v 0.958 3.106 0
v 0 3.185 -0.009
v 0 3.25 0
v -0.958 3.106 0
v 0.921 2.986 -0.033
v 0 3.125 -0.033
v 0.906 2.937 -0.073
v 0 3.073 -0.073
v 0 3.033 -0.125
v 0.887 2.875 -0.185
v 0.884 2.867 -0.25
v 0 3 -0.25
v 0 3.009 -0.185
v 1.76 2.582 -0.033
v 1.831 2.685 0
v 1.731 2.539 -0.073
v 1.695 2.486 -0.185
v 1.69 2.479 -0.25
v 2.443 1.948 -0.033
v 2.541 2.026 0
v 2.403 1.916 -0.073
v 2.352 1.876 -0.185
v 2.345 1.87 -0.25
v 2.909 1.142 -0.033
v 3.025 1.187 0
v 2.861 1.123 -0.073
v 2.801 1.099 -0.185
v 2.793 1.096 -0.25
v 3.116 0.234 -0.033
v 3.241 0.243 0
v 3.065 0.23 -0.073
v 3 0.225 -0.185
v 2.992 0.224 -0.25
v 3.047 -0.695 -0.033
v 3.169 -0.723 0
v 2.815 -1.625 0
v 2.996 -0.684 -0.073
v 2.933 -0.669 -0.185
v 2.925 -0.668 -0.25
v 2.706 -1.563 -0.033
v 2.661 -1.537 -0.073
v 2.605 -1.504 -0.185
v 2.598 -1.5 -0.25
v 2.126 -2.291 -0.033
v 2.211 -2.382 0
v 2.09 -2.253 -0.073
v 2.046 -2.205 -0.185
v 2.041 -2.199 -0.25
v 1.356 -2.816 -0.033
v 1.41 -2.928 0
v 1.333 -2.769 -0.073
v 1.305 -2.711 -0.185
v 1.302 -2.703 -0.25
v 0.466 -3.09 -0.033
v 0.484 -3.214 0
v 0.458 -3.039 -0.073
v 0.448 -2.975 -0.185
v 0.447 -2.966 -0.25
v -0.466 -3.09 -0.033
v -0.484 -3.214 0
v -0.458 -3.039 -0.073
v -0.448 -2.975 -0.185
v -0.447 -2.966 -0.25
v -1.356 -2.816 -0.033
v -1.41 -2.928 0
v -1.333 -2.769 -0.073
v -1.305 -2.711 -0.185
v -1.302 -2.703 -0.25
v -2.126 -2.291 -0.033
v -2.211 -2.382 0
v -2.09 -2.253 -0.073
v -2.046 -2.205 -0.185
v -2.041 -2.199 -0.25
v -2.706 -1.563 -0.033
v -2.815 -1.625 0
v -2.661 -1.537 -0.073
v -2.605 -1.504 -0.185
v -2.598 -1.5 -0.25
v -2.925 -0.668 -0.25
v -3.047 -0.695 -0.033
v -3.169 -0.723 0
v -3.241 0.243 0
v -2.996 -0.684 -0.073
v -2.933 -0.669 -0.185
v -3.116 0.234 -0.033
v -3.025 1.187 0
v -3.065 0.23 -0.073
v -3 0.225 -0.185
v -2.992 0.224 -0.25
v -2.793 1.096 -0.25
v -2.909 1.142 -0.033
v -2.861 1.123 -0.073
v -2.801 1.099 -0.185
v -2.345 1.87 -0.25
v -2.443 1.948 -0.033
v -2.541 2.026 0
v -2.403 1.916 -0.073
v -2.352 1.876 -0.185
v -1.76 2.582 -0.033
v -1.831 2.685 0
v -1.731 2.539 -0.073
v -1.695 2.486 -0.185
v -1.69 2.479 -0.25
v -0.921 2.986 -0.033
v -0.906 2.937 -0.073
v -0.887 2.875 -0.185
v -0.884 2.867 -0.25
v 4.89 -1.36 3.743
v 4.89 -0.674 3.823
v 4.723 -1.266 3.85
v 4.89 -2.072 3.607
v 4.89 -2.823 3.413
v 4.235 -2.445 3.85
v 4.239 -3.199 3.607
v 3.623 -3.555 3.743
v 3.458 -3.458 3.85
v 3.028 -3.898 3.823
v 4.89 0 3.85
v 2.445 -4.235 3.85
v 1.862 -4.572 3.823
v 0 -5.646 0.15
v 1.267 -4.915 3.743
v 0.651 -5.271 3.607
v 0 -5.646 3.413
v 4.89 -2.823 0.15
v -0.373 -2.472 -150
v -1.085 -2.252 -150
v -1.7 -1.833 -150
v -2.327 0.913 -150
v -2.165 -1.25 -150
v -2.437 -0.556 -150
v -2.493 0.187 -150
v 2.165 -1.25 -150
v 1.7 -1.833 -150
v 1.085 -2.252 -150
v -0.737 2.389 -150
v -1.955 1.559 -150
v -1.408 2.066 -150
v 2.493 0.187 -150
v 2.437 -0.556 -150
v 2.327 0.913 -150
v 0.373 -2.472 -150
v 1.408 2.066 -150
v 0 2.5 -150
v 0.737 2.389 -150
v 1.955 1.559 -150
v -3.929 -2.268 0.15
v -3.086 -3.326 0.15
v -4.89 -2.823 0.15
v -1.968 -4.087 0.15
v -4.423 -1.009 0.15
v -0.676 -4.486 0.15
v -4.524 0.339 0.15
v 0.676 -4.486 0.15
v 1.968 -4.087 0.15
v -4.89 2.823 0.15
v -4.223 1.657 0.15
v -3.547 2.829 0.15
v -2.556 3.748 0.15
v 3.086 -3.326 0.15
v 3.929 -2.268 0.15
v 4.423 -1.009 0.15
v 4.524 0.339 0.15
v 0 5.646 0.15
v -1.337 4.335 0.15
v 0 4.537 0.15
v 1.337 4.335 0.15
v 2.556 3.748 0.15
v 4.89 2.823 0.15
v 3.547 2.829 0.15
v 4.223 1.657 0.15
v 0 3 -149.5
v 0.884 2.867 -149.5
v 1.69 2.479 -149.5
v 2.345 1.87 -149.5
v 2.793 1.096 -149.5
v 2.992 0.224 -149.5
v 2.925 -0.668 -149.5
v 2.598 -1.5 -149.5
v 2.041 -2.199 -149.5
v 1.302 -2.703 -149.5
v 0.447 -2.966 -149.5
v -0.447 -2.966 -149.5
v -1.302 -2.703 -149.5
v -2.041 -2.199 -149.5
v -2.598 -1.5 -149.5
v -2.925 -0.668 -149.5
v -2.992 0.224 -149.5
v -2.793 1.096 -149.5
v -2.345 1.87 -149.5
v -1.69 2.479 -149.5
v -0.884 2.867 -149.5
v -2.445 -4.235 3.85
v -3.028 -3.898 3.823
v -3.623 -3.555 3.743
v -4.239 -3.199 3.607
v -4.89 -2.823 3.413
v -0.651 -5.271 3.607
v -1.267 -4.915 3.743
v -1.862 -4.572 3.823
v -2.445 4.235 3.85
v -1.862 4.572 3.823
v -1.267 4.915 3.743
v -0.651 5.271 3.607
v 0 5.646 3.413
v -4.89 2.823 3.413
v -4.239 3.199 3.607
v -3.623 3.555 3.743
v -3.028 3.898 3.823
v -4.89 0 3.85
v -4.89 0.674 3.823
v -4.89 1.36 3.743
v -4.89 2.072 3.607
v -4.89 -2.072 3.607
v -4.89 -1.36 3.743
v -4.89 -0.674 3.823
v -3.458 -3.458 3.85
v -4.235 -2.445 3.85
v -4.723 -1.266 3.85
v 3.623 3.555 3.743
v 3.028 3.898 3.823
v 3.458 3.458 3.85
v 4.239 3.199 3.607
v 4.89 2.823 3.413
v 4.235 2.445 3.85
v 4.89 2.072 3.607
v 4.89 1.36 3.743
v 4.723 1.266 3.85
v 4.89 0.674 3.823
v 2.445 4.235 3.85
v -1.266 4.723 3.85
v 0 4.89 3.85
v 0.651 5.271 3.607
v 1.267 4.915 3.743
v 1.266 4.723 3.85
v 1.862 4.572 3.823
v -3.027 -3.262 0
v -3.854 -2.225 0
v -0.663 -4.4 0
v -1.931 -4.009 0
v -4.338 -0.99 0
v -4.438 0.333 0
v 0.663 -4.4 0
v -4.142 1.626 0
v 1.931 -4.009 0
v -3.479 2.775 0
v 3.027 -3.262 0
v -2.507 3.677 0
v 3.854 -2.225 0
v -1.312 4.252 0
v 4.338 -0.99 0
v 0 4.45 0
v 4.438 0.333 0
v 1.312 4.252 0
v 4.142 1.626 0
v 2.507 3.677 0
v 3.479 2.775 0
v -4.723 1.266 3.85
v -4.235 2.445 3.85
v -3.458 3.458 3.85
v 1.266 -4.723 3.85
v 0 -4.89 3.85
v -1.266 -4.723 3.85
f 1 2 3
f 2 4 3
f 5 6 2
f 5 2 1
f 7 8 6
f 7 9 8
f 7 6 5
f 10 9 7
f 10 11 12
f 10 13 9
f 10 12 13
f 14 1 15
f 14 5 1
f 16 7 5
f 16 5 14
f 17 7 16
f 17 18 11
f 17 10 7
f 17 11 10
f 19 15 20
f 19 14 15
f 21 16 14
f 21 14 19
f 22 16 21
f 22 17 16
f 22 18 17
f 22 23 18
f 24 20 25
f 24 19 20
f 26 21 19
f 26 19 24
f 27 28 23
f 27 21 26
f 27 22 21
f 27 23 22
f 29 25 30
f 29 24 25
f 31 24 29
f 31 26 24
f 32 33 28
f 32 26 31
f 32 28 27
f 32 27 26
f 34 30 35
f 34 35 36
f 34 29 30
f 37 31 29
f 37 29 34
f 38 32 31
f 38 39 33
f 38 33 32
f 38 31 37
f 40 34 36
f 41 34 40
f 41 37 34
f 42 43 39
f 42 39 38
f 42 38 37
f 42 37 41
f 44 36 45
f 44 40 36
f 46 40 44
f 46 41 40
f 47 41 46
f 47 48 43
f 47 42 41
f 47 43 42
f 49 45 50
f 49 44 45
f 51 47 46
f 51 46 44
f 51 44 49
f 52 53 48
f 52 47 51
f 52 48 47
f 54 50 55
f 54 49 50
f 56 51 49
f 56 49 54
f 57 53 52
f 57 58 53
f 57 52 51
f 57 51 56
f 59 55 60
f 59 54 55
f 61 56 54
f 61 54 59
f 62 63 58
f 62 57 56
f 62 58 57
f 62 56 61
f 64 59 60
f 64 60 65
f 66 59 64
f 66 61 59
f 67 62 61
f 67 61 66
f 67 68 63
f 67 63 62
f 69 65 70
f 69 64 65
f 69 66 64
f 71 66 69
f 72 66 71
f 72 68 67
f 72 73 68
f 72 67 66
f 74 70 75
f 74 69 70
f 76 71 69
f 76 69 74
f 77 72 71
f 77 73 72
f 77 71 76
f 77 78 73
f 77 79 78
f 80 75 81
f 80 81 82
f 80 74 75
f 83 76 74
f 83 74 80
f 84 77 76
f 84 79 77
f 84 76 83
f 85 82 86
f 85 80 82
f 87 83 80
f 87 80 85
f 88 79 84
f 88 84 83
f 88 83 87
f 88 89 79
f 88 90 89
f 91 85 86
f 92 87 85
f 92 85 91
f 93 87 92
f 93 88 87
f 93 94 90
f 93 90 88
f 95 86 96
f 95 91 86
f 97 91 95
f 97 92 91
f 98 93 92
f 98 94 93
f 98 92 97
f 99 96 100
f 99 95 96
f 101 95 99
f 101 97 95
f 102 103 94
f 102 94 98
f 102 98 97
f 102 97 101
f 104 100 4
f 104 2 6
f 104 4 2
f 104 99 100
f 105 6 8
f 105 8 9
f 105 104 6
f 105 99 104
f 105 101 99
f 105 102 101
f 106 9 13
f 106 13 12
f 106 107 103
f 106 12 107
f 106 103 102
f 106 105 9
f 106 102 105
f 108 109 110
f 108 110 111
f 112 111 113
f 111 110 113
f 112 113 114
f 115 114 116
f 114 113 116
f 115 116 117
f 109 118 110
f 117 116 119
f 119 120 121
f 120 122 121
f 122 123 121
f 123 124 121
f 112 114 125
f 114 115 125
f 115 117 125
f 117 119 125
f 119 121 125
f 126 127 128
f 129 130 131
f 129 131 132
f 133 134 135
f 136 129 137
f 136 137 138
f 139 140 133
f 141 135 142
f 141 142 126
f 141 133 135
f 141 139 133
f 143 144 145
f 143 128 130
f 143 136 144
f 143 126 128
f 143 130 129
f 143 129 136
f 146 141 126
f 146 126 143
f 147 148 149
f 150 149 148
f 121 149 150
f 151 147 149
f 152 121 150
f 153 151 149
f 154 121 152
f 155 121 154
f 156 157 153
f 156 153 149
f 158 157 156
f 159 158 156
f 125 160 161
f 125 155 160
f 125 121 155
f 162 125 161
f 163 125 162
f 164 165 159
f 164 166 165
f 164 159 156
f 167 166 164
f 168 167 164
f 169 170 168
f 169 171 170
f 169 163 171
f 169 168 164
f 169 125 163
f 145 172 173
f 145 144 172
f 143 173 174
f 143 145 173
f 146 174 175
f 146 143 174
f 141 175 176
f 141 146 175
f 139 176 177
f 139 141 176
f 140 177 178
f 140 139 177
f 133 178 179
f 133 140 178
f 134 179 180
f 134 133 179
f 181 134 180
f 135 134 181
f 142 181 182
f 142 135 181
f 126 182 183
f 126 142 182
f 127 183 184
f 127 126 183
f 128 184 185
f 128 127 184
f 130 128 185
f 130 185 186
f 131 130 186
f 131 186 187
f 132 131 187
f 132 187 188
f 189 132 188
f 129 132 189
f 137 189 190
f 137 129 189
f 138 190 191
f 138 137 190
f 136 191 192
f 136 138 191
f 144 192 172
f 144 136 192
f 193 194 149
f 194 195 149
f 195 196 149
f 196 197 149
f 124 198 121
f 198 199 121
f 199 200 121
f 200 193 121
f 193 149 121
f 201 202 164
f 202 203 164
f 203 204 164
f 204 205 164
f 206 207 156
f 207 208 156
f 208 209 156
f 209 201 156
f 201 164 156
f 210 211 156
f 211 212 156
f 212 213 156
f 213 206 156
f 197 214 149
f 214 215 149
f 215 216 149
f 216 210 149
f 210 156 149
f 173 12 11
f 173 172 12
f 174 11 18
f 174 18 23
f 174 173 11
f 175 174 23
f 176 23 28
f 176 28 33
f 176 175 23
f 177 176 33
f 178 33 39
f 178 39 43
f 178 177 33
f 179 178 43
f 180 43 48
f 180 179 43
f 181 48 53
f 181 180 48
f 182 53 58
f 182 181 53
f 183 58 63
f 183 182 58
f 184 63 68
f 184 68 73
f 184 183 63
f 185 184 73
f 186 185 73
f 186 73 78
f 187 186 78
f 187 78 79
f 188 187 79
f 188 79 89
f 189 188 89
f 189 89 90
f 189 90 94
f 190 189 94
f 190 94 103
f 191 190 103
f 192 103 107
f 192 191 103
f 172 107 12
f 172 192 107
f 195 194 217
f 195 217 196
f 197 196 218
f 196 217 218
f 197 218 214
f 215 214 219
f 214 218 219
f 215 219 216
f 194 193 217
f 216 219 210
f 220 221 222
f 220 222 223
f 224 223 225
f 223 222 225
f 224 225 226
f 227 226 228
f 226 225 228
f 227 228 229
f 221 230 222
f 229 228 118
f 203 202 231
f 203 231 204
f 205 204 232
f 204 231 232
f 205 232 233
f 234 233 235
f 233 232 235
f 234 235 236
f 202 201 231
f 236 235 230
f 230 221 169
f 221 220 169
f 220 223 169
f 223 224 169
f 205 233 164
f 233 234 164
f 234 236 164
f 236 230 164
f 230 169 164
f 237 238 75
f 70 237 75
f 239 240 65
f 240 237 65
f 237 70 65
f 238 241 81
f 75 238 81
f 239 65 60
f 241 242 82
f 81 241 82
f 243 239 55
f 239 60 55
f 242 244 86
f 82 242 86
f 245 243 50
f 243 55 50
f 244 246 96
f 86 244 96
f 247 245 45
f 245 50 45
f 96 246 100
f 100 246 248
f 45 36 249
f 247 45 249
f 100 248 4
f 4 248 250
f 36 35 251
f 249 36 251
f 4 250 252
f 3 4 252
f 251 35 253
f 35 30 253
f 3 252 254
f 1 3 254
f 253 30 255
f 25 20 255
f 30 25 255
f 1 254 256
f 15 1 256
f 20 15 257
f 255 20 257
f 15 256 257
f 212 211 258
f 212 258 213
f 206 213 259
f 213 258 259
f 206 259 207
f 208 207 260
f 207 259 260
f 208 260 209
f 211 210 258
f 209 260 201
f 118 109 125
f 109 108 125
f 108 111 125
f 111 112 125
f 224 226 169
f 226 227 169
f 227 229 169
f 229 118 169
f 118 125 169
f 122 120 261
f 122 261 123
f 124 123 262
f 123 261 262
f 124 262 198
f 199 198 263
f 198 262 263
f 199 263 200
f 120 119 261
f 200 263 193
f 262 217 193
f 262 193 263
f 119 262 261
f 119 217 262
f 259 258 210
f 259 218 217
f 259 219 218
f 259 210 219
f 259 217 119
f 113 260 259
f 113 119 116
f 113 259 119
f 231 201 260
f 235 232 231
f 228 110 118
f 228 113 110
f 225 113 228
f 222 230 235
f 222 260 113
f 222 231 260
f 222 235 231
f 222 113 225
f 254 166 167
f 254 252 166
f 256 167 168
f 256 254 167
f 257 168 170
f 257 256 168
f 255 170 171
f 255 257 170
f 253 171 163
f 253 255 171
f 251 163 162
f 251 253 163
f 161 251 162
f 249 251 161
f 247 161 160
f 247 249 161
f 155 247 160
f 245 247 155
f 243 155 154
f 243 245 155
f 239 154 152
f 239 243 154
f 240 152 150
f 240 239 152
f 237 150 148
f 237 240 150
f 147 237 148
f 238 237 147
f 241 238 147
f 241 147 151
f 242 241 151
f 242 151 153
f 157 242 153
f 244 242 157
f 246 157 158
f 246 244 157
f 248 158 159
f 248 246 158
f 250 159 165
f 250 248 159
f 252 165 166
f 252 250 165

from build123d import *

# Parameters (mm, degrees)
BOSS_EXTRUDE1_DEPTH = 3.85


with BuildPart() as part:
    # Sketch1 → Boss-Extrude1 (new body)
    with BuildSketch(Plane.XY):
        Polygon((0, 5.646485633), (-4.89, 2.823242816), (-4.89, -2.823242816), (0, -5.646485633), (4.89, -2.823242816), (4.89, 2.823242816), align=None)
    extrude(amount=BOSS_EXTRUDE1_DEPTH)

    # Sketch2 → Revolve1 (revolve)
    with BuildSketch(Plane(origin=(0, 0, 0), x_dir=(0, 0, -1), z_dir=(1, 0, 0))):
        with BuildLine():
            Line((0, 0), (0, 3.25))
            ThreePointArc((0, 3.25), (0.073223305, 3.073223305), (0.25, 3))
            Line((0.25, 3), (149.5, 3))
            Line((149.5, 3), (150, 2.5))
            Line((150, 2.5), (150, 0))
            Line((150, 0), (0, 0))
        make_face()
    revolve(axis=Axis((0, 0, 0), (0, 0, -1)))

    # Sketch3 → Cut-Revolve1 (revolve, cut)
    with BuildSketch(Plane(origin=(0, 0, 0), x_dir=(0, 0, -1), z_dir=(1, 0, 0))):
        Polygon((-3.85, 5.646485633), (-3.413242816, 5.646485633), (-3.85, 4.89), align=None)
        Polygon((-0.15, 5.646485633), (-0.15, 4.53660254), (0, 4.45), (0, 5.646485633), align=None)
    revolve(axis=Axis((0, 0, 12.204941078), (0, 0, -1)), mode=Mode.SUBTRACT)


solid = part.part
